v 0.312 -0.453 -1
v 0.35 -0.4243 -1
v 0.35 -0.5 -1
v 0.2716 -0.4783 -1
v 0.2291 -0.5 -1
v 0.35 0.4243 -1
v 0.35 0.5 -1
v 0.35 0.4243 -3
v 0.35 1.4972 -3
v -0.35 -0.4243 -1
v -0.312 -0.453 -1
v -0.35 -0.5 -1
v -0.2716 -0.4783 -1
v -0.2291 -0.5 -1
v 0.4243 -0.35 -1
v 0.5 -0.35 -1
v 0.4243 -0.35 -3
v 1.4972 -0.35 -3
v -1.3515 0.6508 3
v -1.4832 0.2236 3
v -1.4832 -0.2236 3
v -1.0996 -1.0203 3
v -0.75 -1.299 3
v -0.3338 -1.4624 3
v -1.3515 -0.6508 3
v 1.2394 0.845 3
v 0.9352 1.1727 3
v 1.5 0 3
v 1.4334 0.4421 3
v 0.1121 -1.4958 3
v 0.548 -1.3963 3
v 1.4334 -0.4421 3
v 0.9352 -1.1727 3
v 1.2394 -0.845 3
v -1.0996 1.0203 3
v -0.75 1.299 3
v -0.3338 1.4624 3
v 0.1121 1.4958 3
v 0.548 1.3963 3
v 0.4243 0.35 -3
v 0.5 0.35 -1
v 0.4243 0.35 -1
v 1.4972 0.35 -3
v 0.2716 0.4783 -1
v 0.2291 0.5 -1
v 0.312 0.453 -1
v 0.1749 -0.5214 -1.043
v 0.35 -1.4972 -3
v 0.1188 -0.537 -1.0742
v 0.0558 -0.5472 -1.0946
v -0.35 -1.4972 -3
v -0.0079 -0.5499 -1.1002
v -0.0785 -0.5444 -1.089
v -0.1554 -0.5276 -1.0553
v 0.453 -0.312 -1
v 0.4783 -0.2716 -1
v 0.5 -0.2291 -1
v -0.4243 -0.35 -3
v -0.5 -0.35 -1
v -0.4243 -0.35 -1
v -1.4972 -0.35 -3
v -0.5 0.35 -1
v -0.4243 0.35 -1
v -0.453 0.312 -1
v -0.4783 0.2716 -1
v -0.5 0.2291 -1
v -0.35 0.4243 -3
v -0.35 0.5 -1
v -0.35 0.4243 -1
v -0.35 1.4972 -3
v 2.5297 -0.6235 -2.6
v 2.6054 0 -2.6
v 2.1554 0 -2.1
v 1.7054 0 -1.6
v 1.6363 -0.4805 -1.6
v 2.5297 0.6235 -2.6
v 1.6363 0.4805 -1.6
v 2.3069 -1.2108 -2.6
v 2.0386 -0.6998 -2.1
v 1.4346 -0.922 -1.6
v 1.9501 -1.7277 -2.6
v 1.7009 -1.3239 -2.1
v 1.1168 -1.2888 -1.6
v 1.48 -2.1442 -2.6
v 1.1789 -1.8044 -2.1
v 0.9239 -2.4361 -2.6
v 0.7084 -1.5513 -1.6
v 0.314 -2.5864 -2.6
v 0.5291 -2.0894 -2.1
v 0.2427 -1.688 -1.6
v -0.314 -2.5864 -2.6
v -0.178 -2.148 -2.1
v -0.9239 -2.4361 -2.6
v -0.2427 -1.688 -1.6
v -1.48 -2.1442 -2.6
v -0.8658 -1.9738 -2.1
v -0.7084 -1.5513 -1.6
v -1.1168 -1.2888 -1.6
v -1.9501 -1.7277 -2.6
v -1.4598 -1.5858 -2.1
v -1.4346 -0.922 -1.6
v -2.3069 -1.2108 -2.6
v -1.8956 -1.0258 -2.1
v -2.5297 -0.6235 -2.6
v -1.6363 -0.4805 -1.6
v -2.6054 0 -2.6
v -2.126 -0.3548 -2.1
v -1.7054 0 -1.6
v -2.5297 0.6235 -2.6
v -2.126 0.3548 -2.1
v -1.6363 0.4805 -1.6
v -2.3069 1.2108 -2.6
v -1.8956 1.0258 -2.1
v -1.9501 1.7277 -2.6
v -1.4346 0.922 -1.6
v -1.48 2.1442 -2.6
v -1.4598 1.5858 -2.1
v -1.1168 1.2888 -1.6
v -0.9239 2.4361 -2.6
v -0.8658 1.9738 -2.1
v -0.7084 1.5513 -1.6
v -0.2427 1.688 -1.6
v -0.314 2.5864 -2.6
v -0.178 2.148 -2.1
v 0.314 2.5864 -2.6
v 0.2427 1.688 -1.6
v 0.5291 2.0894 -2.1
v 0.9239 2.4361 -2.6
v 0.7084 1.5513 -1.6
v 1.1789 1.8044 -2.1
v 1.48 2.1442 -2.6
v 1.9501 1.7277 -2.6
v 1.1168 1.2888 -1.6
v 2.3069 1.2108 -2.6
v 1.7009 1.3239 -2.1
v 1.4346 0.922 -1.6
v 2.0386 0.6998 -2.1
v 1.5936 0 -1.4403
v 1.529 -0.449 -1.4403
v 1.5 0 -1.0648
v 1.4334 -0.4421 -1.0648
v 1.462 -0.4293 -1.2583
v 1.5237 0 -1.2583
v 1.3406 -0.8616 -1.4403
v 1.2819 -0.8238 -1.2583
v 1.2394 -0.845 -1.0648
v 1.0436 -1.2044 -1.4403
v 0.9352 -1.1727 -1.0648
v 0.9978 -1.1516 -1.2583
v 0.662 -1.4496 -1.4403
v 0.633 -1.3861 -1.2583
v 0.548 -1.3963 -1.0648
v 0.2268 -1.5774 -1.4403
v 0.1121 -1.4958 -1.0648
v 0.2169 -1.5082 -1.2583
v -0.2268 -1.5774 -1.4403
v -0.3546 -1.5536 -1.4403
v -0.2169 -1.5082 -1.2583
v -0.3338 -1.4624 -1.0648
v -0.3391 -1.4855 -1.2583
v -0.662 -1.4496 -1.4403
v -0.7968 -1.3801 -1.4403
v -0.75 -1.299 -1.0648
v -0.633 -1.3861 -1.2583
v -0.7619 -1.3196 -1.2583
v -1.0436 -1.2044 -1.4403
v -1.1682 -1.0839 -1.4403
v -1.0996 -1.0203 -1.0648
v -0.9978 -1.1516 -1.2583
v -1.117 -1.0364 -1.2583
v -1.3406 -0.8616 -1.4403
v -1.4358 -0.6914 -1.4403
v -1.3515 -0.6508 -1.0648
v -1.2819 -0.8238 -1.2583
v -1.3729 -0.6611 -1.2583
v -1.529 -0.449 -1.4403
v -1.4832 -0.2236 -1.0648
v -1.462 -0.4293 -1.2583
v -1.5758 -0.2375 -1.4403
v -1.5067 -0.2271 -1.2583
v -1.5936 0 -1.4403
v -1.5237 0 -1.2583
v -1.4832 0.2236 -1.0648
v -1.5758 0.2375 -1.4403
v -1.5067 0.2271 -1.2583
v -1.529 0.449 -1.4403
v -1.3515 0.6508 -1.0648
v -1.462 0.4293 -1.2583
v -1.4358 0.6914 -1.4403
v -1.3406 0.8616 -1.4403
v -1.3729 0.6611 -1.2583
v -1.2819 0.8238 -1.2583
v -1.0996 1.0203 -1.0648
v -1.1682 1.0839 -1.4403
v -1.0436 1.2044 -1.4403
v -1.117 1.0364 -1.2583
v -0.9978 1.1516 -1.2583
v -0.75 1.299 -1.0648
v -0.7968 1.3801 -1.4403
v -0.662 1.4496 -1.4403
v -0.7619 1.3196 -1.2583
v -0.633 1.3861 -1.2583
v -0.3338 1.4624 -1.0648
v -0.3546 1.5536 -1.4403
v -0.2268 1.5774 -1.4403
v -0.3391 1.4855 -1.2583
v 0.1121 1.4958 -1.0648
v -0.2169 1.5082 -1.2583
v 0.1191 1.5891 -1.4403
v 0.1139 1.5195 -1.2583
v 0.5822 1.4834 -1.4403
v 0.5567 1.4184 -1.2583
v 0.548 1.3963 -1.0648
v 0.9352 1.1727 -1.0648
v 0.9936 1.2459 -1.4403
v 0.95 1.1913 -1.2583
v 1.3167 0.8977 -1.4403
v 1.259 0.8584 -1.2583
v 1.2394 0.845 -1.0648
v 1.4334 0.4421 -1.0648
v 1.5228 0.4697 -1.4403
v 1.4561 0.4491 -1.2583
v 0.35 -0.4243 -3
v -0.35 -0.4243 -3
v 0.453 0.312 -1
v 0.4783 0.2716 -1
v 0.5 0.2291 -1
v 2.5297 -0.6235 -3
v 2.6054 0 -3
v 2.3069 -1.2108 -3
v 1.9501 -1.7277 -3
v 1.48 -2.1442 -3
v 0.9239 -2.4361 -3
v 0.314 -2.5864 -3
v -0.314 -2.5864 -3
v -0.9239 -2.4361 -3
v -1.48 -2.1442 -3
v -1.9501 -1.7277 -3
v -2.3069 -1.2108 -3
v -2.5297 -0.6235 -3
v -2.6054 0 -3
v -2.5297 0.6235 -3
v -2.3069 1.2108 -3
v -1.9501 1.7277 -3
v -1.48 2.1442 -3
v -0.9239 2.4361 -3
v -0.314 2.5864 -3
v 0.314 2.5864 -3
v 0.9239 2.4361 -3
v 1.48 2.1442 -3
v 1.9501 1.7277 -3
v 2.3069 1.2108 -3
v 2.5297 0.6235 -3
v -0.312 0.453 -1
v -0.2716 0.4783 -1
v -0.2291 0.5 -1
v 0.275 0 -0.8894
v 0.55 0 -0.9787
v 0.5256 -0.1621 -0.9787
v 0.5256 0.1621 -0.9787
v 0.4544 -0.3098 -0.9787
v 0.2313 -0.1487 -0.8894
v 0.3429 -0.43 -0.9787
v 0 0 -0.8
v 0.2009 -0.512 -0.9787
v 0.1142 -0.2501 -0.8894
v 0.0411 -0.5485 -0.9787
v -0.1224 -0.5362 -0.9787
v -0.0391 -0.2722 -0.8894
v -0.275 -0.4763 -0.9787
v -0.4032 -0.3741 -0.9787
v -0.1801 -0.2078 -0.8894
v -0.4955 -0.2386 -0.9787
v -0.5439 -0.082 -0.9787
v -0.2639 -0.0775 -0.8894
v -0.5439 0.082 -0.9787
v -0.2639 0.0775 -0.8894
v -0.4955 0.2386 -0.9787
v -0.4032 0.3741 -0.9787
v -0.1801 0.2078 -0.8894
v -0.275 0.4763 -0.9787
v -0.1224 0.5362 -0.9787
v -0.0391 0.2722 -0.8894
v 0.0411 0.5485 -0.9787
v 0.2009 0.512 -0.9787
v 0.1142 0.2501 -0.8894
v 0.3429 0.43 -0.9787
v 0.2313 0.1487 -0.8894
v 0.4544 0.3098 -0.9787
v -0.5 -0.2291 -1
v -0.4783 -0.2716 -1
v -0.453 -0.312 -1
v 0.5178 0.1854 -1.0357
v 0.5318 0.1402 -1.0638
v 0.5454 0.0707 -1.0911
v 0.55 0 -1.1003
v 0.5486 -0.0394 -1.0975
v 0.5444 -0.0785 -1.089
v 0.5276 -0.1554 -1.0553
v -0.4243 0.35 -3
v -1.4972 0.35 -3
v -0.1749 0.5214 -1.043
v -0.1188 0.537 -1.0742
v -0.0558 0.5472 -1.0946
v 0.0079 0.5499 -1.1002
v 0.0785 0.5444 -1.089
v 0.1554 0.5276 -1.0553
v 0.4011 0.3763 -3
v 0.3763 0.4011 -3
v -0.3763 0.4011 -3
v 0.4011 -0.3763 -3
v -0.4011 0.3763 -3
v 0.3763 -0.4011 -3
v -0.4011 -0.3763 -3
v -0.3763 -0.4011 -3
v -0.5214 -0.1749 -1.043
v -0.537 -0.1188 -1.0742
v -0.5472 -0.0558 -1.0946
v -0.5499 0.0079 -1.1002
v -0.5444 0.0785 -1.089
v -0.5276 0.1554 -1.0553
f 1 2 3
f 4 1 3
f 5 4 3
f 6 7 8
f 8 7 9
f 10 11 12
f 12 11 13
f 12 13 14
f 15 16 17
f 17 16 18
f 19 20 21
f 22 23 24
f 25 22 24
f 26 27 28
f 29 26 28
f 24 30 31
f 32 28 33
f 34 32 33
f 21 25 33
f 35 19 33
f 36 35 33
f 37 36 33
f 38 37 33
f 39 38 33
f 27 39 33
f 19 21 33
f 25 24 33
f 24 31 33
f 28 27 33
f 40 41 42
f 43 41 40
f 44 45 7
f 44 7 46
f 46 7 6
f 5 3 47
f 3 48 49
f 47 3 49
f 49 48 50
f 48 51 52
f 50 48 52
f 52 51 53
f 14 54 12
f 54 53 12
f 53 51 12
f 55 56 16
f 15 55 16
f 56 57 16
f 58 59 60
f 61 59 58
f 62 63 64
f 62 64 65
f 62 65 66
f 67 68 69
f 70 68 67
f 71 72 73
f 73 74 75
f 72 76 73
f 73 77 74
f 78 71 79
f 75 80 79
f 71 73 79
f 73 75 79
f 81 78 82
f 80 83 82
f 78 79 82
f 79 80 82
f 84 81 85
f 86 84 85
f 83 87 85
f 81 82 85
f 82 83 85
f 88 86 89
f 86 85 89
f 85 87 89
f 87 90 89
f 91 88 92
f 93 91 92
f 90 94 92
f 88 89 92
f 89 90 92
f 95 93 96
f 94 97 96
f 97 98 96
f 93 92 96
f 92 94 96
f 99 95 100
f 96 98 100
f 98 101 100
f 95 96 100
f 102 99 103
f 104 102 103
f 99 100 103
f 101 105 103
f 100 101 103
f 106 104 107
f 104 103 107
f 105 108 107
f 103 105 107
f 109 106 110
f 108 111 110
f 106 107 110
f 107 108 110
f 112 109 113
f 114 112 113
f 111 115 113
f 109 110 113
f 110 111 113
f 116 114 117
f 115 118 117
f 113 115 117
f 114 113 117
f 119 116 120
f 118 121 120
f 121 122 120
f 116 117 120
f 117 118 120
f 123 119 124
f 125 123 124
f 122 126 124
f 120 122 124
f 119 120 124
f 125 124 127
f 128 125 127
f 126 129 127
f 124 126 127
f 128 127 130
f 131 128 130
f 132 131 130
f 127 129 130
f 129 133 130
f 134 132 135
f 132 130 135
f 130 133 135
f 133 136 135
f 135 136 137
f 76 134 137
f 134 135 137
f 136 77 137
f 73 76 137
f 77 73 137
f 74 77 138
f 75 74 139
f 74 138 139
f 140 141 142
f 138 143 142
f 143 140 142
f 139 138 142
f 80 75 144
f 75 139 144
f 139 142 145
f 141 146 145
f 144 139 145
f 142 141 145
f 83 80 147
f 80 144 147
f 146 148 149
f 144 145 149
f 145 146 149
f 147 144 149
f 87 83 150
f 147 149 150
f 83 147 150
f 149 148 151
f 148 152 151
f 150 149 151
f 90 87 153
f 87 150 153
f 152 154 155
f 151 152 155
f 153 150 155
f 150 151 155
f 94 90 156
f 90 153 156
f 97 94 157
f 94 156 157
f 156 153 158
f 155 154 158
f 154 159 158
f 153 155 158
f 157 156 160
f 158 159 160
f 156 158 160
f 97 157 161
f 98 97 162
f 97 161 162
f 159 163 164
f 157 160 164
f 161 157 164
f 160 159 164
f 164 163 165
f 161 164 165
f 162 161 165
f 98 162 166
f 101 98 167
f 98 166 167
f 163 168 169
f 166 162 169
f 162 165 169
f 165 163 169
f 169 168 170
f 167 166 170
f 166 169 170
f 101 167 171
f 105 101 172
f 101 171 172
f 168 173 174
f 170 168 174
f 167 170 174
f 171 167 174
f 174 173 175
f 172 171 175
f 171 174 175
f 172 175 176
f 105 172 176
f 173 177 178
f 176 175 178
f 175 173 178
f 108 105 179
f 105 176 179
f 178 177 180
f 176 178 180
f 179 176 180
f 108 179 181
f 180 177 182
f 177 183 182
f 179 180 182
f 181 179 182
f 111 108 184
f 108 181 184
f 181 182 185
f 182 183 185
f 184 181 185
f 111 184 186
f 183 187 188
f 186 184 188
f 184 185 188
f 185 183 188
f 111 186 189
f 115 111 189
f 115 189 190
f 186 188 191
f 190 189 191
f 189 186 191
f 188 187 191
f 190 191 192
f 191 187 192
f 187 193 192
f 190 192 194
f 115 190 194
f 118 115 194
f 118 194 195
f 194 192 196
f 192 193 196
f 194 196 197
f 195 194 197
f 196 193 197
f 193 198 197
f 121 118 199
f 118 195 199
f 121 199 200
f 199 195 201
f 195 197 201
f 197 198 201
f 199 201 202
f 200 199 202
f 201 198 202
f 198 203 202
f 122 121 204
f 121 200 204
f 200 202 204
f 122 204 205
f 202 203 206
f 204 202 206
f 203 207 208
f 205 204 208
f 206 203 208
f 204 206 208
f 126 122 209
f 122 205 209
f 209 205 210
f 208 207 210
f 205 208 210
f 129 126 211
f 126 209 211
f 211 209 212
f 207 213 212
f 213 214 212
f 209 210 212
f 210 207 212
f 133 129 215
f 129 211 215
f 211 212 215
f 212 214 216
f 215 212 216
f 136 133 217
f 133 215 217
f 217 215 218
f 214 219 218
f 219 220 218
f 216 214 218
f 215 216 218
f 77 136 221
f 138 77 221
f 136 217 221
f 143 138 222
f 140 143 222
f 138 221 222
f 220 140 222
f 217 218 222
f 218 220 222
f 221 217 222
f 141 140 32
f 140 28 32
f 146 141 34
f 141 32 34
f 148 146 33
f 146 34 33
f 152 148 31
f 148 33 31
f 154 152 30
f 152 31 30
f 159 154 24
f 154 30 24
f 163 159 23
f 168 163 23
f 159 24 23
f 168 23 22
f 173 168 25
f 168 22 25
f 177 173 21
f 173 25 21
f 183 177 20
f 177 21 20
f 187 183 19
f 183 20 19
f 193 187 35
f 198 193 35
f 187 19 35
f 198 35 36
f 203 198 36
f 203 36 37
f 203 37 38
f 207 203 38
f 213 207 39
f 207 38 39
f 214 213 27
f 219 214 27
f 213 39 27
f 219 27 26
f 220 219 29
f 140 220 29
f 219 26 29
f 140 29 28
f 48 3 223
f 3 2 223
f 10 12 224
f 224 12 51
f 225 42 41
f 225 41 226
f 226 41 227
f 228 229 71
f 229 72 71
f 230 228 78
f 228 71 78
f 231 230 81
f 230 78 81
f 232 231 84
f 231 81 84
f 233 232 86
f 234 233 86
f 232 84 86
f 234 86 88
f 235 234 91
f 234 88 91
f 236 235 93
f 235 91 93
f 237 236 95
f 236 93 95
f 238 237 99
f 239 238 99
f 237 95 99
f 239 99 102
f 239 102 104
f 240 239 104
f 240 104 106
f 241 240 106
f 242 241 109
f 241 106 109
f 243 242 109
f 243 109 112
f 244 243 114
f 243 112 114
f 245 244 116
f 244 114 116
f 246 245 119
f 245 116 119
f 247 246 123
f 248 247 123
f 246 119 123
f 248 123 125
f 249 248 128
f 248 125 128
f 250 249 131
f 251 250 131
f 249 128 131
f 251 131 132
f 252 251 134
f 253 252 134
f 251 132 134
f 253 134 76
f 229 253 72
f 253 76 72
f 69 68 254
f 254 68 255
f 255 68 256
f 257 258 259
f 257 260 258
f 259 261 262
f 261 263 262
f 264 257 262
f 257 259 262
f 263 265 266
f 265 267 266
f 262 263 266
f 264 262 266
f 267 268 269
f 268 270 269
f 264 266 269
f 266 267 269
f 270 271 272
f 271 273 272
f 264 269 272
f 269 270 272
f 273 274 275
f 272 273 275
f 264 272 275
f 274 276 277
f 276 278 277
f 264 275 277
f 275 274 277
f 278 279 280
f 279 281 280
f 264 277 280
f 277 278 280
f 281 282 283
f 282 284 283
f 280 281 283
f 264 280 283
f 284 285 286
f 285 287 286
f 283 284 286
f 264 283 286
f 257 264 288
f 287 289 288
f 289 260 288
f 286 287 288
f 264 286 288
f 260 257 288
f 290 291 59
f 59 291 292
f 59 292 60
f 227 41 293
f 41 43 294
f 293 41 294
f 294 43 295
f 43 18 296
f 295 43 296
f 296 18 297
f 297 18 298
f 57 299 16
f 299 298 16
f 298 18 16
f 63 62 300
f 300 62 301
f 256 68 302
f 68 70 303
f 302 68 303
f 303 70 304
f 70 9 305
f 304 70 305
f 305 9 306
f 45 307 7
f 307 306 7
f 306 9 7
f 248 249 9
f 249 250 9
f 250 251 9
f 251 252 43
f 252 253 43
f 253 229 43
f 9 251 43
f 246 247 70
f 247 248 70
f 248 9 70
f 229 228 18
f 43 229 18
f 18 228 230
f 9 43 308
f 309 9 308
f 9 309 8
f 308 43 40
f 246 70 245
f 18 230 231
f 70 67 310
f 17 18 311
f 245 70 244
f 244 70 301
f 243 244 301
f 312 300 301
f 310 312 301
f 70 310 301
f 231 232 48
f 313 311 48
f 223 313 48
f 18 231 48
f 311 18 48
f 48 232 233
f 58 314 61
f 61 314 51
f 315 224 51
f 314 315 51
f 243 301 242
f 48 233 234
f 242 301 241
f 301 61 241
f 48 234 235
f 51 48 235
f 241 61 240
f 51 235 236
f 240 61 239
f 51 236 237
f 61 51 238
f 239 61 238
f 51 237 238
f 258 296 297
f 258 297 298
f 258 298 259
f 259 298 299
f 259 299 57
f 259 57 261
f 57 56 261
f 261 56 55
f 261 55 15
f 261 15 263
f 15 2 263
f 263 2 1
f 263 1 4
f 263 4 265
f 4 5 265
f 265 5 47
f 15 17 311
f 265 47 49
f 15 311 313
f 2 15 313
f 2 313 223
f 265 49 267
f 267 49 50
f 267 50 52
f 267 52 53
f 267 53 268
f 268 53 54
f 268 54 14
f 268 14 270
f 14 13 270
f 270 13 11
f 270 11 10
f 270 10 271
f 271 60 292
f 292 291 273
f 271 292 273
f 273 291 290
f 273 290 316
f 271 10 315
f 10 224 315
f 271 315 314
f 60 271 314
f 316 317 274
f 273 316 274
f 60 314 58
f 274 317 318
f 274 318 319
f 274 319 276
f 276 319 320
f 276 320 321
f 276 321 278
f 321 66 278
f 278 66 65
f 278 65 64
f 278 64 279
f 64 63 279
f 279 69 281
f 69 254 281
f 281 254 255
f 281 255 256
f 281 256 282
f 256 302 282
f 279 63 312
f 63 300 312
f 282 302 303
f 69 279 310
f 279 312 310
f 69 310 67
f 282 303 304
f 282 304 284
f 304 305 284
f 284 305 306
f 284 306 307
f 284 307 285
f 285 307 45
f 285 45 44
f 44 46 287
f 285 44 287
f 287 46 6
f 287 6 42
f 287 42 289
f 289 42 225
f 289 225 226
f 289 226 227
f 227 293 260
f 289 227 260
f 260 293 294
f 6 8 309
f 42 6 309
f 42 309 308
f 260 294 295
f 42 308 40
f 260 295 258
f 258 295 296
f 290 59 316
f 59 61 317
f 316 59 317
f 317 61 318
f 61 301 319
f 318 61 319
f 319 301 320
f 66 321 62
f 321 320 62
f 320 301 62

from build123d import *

# Parameters (mm, degrees)
CUT_EXTRUDE_1_DEPTH      = 0.35
PATTERN_CIRCULAR_1_COUNT = 4


with BuildPart() as part:
    # Эскиз1 → Повернуть1 (revolve)
    with BuildSketch(Plane(origin=(0, 0, 0), x_dir=(0, 0, -1), z_dir=(1, 0, 0))):
        with BuildLine():
            Line((-3, 0), (3, 0))
            Line((3, 0), (3, 2.605364683))
            Line((3, 2.605364683), (2.6, 2.605364683))
            Line((2.6, 2.605364683), (1.6, 1.705364683))
            ThreePointArc((1.6, 1.705364683), (1.351439228, 1.553103671), (1.064828215, 1.5))
            Line((1.064828215, 1.5), (-3, 1.5))
            Line((-3, 1.5), (-3, 0))
        make_face()
    revolve(axis=Axis((0, 0, -3), (0, 0, -1)))

    # Эскиз2 → Вырез-Вытянуть1 (cut, symmetric)
    with BuildSketch(Plane(origin=(0, 0, 0), x_dir=(0, 0, -1), z_dir=(1, 0, 0))):
        Polygon((3, 0), (3, 1.497163216), (1, 0.5), (1, 0), align=None)
    cut_extrude_1 = extrude(amount=CUT_EXTRUDE_1_DEPTH, both=True, mode=Mode.SUBTRACT)

    # Круговой массив1: Вырез-Вытянуть1 ×4 about axis
    pattern_circular_1_axis = Axis((0, 0, -3), (0, 0, 1))
    for i in range(1, PATTERN_CIRCULAR_1_COUNT):
        add(cut_extrude_1.rotate(pattern_circular_1_axis, i * 360 / PATTERN_CIRCULAR_1_COUNT), mode=Mode.SUBTRACT)

    # Эскиз3 → Вырез-Повернуть1 (revolve, cut)
    with BuildSketch(Plane(origin=(0, 0, 0), x_dir=(0, 0, -1), z_dir=(1, 0, 0))):
        Polygon((0.8, 0), (0.978705833, 0.55), (3, 0.55), (3, 0), align=None)
    revolve(axis=Axis((0, 0, 0), (0, 0, -1)), mode=Mode.SUBTRACT)


solid = part.part
